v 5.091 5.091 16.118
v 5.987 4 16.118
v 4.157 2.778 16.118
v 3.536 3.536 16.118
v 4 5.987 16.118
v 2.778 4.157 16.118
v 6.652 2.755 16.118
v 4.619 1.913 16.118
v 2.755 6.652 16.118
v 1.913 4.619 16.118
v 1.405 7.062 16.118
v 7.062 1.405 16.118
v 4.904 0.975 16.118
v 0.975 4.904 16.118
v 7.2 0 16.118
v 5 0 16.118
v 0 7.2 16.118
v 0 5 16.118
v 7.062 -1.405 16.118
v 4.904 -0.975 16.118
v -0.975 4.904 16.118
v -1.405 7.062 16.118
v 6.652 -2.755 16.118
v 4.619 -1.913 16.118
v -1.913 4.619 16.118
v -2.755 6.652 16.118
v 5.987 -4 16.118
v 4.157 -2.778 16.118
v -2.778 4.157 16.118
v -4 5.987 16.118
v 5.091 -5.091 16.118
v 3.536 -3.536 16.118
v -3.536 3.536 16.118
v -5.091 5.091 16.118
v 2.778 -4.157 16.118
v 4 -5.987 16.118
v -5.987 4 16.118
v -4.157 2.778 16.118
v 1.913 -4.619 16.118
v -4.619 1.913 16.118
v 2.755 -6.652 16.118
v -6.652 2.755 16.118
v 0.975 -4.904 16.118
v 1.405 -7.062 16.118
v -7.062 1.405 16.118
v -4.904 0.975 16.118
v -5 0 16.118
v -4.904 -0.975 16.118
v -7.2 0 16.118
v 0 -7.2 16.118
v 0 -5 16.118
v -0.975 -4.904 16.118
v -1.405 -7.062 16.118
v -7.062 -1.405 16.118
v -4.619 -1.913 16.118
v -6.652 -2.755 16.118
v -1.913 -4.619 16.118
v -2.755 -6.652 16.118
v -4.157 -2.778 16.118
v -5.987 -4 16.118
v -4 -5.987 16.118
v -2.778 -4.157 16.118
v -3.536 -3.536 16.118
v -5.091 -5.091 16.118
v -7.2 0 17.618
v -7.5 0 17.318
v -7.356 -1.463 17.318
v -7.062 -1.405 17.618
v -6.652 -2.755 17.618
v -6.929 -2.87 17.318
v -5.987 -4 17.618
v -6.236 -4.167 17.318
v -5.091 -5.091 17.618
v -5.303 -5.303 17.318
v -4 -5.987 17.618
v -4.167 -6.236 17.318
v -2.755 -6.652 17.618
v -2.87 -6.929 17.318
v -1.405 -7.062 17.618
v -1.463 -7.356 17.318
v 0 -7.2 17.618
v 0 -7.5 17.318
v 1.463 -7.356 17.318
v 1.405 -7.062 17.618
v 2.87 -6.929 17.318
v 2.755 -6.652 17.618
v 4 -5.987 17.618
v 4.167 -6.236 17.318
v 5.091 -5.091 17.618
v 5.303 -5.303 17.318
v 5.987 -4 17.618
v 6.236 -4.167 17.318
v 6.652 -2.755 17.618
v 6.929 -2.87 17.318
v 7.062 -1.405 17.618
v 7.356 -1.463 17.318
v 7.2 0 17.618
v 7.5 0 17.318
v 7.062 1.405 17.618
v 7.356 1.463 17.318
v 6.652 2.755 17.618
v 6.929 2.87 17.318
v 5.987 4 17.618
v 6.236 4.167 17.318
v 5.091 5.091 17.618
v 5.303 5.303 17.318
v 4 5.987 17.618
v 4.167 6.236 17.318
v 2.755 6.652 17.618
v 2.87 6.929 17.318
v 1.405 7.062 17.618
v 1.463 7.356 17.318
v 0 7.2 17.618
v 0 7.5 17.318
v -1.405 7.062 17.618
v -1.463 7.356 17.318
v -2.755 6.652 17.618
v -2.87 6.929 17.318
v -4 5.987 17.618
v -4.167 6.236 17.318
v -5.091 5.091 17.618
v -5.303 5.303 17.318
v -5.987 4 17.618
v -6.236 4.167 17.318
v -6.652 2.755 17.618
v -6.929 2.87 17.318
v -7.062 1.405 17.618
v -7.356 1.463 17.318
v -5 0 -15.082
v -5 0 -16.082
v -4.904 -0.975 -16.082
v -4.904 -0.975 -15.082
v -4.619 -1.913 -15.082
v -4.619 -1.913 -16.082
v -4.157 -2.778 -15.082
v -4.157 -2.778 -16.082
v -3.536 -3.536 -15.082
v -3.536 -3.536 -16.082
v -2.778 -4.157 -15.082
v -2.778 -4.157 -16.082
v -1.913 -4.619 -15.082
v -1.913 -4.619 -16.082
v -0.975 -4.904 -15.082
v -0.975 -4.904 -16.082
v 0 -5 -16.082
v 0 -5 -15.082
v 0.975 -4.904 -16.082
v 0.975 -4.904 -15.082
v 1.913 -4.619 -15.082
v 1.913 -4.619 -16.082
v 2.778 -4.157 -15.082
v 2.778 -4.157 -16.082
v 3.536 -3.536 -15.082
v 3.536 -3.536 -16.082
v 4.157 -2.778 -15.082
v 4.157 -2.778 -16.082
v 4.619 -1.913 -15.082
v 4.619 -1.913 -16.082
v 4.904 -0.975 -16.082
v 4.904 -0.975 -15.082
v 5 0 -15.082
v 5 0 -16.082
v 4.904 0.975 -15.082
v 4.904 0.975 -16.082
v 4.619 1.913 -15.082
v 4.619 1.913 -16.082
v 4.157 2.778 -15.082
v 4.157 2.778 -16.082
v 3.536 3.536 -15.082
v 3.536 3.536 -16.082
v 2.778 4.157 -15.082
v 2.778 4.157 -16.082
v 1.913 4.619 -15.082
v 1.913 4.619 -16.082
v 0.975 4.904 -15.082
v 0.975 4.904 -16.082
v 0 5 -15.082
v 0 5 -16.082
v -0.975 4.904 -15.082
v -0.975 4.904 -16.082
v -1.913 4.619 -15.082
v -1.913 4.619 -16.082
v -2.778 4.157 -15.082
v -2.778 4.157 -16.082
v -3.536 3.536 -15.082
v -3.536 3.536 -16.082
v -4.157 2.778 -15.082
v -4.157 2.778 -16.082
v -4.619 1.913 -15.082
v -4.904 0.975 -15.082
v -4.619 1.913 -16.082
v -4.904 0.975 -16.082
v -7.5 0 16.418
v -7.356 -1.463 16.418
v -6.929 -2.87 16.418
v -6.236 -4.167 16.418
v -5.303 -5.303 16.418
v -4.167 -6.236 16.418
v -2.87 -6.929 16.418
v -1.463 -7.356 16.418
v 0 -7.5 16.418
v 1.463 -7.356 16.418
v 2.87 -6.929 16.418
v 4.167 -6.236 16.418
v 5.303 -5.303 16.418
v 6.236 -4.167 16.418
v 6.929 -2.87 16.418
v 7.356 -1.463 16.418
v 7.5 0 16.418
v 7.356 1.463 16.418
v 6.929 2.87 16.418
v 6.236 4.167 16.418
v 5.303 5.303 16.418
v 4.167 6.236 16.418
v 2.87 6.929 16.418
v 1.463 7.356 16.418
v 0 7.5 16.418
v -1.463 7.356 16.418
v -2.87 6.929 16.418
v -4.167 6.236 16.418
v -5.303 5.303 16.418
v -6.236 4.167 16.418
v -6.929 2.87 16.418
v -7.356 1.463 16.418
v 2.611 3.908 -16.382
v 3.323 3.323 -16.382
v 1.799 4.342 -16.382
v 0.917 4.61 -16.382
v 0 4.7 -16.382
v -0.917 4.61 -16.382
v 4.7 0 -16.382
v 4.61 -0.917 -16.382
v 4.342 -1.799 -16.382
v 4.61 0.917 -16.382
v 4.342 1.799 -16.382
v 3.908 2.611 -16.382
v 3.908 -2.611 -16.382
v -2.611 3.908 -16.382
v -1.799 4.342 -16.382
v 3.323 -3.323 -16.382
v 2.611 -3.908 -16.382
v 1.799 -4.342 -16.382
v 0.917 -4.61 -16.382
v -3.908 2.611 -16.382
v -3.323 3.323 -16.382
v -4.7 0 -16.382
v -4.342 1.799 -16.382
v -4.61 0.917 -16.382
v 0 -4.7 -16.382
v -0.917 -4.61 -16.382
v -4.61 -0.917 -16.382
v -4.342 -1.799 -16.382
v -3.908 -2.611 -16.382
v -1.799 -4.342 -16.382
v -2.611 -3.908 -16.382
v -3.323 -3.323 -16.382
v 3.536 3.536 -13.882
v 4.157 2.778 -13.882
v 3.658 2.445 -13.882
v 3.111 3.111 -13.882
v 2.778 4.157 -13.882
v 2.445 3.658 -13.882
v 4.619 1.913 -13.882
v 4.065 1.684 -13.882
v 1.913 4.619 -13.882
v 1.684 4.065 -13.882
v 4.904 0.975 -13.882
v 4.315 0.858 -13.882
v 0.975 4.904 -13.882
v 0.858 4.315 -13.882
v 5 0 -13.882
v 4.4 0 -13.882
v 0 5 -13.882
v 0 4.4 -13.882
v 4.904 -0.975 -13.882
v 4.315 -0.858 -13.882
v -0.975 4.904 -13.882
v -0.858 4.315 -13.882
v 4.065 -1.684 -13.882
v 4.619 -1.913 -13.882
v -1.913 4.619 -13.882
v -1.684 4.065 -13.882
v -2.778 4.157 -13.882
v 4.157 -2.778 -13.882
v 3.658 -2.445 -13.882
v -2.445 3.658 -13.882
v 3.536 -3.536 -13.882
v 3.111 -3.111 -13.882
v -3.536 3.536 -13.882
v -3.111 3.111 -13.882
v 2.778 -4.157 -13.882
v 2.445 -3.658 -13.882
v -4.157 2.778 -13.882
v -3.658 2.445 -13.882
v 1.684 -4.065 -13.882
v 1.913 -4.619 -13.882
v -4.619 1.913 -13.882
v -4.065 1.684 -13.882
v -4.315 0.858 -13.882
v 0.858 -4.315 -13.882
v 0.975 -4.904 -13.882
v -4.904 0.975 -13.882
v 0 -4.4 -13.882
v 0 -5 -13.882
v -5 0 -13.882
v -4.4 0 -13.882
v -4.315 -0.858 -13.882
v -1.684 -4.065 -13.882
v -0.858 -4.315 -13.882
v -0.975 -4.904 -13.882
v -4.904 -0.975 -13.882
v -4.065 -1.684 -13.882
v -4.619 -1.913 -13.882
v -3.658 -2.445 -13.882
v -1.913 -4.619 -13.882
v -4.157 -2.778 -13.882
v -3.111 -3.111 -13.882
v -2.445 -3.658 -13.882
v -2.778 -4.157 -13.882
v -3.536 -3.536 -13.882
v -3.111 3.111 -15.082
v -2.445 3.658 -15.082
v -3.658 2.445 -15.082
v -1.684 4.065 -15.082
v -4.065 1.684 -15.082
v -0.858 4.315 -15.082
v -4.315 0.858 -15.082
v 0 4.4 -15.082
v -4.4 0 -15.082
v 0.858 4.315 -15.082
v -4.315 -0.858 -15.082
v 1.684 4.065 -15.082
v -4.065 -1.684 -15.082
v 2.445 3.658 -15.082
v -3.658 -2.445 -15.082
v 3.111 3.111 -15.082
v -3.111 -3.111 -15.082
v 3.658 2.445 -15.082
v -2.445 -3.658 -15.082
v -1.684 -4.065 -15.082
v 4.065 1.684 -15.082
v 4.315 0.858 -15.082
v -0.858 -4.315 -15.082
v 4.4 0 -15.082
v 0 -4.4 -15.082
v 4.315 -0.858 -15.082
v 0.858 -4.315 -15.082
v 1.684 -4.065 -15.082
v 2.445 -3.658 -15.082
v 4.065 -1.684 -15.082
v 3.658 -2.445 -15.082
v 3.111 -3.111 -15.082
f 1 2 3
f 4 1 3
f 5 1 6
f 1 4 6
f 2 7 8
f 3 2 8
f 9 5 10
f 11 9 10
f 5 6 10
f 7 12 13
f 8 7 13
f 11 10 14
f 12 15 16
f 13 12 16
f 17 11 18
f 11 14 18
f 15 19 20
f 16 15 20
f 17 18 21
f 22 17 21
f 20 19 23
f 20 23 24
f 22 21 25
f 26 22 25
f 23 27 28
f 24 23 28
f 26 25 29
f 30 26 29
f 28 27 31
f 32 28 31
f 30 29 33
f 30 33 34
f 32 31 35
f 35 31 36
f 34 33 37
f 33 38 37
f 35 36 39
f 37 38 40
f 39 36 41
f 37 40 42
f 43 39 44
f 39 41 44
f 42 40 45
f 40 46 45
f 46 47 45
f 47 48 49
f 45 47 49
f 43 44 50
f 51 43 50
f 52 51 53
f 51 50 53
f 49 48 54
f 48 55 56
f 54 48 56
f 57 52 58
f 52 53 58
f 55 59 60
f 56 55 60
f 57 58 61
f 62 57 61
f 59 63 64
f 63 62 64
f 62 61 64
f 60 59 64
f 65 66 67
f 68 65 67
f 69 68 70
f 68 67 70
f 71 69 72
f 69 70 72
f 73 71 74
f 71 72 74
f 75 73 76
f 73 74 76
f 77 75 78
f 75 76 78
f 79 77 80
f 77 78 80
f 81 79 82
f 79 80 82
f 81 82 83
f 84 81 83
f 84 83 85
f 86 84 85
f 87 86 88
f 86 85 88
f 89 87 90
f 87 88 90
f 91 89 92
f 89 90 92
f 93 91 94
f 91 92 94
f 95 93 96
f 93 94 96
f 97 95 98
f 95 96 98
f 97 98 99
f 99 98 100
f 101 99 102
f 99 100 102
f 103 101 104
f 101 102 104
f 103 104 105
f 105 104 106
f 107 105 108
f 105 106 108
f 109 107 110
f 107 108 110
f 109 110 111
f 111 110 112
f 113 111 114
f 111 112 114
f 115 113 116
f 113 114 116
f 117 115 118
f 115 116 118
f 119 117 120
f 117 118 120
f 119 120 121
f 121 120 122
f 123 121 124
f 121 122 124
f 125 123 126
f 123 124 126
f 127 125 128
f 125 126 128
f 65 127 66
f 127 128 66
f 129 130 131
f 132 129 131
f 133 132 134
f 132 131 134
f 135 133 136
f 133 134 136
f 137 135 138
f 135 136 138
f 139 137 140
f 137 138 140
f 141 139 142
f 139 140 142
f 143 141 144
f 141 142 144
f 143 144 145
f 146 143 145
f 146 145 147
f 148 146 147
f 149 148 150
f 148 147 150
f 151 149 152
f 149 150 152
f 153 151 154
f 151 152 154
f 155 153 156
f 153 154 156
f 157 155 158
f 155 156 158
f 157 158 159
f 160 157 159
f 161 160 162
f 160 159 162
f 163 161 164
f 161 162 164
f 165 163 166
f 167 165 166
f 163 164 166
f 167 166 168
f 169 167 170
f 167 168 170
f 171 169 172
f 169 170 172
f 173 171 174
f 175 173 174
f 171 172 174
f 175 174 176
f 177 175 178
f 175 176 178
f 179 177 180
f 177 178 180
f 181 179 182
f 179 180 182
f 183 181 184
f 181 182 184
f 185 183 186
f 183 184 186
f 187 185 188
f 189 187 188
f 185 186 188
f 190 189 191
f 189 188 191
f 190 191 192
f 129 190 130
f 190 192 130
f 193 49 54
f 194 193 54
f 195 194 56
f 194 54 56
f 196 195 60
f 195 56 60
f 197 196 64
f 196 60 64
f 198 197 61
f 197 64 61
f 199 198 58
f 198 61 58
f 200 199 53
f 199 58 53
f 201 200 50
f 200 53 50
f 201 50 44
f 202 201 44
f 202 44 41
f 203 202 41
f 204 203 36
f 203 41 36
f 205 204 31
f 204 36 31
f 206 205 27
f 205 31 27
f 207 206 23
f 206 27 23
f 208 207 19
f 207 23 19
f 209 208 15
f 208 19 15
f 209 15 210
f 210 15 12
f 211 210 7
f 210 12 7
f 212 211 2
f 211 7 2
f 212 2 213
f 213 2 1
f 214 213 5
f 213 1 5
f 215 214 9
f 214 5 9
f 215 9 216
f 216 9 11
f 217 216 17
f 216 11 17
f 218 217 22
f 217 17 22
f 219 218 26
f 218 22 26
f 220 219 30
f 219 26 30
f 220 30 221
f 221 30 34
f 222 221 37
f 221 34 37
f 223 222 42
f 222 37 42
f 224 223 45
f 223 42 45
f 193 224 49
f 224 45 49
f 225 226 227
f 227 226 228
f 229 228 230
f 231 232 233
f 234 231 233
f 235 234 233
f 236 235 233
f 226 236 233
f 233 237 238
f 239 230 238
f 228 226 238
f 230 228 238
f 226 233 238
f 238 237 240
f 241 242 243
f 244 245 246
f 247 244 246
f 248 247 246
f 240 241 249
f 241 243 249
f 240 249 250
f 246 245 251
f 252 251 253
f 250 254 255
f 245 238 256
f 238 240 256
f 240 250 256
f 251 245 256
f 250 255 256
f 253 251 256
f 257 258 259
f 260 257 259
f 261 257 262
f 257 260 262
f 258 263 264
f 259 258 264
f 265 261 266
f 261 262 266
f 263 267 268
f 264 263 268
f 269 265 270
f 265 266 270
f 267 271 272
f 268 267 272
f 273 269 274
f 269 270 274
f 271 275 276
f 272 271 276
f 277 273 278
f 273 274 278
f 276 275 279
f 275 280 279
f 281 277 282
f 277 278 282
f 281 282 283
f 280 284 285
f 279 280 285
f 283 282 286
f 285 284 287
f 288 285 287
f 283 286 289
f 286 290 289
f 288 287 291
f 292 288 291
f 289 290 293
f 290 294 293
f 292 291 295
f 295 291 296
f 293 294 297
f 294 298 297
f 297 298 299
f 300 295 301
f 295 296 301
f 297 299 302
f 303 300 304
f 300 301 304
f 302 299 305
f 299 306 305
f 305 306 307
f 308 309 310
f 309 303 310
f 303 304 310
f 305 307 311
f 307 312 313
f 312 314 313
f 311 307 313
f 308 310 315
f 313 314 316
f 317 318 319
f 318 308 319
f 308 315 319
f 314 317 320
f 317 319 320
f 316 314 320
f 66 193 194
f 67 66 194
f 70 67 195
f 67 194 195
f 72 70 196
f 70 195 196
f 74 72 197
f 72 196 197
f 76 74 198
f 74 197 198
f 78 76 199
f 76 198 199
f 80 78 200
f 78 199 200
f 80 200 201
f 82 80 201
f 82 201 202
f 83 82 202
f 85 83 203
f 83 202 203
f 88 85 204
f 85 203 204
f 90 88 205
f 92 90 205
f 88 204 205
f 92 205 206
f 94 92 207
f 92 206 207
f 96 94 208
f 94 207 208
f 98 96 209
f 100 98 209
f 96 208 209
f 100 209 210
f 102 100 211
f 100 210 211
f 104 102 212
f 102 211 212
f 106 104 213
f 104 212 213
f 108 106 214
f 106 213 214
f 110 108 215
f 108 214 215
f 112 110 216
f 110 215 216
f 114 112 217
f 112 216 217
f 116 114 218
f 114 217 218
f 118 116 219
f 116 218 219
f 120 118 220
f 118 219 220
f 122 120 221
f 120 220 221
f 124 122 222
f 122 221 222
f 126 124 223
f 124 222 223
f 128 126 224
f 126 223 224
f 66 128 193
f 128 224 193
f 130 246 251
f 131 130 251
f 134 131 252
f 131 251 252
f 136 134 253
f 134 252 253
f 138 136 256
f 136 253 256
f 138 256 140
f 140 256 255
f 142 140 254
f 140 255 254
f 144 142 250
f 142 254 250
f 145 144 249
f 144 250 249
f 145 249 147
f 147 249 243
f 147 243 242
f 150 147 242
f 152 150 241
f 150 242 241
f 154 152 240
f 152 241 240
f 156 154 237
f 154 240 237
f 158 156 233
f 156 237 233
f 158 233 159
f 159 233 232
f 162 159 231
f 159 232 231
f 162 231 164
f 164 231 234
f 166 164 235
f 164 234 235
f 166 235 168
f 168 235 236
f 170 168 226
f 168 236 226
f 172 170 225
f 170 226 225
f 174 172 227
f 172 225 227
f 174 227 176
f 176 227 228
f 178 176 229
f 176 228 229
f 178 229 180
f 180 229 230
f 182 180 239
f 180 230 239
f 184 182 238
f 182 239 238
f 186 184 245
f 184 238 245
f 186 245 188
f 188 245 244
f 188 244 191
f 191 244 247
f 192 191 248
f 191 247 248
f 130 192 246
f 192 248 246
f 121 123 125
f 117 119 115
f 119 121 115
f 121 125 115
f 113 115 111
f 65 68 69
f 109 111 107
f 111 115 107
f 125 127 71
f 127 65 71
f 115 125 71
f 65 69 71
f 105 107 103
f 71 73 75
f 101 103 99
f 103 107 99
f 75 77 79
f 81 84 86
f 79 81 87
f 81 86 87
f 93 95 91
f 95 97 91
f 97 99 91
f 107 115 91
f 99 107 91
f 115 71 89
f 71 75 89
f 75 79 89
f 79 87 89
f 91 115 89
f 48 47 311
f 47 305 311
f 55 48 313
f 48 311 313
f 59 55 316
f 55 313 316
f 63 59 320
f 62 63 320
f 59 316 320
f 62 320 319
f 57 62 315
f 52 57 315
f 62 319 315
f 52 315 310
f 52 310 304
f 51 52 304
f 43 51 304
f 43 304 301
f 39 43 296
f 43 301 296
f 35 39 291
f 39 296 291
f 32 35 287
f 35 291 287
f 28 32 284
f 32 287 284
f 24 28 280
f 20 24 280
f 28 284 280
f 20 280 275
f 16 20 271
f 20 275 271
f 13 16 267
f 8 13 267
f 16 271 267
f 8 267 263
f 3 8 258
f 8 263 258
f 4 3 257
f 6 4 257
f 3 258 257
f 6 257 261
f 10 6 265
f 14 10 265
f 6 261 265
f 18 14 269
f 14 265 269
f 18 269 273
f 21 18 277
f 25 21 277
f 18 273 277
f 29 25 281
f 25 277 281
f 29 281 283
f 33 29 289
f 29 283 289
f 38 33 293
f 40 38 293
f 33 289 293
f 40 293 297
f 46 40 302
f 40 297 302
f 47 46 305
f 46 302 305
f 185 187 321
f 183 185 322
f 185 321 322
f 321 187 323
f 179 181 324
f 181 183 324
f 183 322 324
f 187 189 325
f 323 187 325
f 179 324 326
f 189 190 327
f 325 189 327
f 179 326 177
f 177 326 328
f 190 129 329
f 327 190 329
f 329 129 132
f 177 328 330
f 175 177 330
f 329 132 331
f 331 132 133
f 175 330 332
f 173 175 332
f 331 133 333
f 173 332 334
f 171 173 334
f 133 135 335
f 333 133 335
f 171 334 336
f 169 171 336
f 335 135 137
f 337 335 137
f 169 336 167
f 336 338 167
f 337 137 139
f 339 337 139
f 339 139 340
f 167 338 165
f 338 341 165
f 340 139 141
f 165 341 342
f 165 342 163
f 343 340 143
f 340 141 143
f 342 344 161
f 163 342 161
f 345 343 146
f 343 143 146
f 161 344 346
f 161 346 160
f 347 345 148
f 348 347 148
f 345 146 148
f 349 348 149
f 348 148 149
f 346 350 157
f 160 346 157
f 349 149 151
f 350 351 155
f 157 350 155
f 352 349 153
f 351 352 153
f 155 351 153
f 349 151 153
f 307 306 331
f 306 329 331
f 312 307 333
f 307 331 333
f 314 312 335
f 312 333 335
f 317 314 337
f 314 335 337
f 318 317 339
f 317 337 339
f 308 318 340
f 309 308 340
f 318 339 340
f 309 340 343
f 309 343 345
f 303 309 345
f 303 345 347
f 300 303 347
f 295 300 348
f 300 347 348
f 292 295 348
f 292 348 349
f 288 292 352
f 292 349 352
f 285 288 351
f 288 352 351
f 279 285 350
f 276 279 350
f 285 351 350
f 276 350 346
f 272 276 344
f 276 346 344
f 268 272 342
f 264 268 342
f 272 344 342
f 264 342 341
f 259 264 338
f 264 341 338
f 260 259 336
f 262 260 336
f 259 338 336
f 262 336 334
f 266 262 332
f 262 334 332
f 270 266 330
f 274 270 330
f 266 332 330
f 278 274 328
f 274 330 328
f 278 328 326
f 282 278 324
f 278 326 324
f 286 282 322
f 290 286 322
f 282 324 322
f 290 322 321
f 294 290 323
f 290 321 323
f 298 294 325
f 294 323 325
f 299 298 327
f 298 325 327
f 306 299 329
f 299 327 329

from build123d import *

# Parameters (mm, degrees)
CHAMFER1_SIZE = 0.3


with BuildPart() as part:
    # Sketch1 → Revolve1 (revolve)
    with BuildSketch(Plane(origin=(0, 0, 0), x_dir=(1, 0, 0), z_dir=(0, 1, 0))):
        Polygon((0, -17.618415179), (-7.5, -17.618415179), (-7.5, -16.118415179), (-5, -16.118415179), (-5, 13.881584821), (-4.4, 13.881584821), (-4.4, 15.081584821), (-5, 15.081584821), (-5, 16.381584821), (0, 16.381584821), align=None)
    revolve(axis=Axis((0, 0, -34.457254464), (0, 0, 1)))

    # Chamfer1
    chamfer1_edges = [part.edges().sort_by_distance(p)[0] for p in [
        (5, 0, -16.381584821),
        (7.5, 0, 16.118415179),
        (7.5, 0, 17.618415179),
    ]]
    chamfer(chamfer1_edges, length=CHAMFER1_SIZE)


solid = part.part
